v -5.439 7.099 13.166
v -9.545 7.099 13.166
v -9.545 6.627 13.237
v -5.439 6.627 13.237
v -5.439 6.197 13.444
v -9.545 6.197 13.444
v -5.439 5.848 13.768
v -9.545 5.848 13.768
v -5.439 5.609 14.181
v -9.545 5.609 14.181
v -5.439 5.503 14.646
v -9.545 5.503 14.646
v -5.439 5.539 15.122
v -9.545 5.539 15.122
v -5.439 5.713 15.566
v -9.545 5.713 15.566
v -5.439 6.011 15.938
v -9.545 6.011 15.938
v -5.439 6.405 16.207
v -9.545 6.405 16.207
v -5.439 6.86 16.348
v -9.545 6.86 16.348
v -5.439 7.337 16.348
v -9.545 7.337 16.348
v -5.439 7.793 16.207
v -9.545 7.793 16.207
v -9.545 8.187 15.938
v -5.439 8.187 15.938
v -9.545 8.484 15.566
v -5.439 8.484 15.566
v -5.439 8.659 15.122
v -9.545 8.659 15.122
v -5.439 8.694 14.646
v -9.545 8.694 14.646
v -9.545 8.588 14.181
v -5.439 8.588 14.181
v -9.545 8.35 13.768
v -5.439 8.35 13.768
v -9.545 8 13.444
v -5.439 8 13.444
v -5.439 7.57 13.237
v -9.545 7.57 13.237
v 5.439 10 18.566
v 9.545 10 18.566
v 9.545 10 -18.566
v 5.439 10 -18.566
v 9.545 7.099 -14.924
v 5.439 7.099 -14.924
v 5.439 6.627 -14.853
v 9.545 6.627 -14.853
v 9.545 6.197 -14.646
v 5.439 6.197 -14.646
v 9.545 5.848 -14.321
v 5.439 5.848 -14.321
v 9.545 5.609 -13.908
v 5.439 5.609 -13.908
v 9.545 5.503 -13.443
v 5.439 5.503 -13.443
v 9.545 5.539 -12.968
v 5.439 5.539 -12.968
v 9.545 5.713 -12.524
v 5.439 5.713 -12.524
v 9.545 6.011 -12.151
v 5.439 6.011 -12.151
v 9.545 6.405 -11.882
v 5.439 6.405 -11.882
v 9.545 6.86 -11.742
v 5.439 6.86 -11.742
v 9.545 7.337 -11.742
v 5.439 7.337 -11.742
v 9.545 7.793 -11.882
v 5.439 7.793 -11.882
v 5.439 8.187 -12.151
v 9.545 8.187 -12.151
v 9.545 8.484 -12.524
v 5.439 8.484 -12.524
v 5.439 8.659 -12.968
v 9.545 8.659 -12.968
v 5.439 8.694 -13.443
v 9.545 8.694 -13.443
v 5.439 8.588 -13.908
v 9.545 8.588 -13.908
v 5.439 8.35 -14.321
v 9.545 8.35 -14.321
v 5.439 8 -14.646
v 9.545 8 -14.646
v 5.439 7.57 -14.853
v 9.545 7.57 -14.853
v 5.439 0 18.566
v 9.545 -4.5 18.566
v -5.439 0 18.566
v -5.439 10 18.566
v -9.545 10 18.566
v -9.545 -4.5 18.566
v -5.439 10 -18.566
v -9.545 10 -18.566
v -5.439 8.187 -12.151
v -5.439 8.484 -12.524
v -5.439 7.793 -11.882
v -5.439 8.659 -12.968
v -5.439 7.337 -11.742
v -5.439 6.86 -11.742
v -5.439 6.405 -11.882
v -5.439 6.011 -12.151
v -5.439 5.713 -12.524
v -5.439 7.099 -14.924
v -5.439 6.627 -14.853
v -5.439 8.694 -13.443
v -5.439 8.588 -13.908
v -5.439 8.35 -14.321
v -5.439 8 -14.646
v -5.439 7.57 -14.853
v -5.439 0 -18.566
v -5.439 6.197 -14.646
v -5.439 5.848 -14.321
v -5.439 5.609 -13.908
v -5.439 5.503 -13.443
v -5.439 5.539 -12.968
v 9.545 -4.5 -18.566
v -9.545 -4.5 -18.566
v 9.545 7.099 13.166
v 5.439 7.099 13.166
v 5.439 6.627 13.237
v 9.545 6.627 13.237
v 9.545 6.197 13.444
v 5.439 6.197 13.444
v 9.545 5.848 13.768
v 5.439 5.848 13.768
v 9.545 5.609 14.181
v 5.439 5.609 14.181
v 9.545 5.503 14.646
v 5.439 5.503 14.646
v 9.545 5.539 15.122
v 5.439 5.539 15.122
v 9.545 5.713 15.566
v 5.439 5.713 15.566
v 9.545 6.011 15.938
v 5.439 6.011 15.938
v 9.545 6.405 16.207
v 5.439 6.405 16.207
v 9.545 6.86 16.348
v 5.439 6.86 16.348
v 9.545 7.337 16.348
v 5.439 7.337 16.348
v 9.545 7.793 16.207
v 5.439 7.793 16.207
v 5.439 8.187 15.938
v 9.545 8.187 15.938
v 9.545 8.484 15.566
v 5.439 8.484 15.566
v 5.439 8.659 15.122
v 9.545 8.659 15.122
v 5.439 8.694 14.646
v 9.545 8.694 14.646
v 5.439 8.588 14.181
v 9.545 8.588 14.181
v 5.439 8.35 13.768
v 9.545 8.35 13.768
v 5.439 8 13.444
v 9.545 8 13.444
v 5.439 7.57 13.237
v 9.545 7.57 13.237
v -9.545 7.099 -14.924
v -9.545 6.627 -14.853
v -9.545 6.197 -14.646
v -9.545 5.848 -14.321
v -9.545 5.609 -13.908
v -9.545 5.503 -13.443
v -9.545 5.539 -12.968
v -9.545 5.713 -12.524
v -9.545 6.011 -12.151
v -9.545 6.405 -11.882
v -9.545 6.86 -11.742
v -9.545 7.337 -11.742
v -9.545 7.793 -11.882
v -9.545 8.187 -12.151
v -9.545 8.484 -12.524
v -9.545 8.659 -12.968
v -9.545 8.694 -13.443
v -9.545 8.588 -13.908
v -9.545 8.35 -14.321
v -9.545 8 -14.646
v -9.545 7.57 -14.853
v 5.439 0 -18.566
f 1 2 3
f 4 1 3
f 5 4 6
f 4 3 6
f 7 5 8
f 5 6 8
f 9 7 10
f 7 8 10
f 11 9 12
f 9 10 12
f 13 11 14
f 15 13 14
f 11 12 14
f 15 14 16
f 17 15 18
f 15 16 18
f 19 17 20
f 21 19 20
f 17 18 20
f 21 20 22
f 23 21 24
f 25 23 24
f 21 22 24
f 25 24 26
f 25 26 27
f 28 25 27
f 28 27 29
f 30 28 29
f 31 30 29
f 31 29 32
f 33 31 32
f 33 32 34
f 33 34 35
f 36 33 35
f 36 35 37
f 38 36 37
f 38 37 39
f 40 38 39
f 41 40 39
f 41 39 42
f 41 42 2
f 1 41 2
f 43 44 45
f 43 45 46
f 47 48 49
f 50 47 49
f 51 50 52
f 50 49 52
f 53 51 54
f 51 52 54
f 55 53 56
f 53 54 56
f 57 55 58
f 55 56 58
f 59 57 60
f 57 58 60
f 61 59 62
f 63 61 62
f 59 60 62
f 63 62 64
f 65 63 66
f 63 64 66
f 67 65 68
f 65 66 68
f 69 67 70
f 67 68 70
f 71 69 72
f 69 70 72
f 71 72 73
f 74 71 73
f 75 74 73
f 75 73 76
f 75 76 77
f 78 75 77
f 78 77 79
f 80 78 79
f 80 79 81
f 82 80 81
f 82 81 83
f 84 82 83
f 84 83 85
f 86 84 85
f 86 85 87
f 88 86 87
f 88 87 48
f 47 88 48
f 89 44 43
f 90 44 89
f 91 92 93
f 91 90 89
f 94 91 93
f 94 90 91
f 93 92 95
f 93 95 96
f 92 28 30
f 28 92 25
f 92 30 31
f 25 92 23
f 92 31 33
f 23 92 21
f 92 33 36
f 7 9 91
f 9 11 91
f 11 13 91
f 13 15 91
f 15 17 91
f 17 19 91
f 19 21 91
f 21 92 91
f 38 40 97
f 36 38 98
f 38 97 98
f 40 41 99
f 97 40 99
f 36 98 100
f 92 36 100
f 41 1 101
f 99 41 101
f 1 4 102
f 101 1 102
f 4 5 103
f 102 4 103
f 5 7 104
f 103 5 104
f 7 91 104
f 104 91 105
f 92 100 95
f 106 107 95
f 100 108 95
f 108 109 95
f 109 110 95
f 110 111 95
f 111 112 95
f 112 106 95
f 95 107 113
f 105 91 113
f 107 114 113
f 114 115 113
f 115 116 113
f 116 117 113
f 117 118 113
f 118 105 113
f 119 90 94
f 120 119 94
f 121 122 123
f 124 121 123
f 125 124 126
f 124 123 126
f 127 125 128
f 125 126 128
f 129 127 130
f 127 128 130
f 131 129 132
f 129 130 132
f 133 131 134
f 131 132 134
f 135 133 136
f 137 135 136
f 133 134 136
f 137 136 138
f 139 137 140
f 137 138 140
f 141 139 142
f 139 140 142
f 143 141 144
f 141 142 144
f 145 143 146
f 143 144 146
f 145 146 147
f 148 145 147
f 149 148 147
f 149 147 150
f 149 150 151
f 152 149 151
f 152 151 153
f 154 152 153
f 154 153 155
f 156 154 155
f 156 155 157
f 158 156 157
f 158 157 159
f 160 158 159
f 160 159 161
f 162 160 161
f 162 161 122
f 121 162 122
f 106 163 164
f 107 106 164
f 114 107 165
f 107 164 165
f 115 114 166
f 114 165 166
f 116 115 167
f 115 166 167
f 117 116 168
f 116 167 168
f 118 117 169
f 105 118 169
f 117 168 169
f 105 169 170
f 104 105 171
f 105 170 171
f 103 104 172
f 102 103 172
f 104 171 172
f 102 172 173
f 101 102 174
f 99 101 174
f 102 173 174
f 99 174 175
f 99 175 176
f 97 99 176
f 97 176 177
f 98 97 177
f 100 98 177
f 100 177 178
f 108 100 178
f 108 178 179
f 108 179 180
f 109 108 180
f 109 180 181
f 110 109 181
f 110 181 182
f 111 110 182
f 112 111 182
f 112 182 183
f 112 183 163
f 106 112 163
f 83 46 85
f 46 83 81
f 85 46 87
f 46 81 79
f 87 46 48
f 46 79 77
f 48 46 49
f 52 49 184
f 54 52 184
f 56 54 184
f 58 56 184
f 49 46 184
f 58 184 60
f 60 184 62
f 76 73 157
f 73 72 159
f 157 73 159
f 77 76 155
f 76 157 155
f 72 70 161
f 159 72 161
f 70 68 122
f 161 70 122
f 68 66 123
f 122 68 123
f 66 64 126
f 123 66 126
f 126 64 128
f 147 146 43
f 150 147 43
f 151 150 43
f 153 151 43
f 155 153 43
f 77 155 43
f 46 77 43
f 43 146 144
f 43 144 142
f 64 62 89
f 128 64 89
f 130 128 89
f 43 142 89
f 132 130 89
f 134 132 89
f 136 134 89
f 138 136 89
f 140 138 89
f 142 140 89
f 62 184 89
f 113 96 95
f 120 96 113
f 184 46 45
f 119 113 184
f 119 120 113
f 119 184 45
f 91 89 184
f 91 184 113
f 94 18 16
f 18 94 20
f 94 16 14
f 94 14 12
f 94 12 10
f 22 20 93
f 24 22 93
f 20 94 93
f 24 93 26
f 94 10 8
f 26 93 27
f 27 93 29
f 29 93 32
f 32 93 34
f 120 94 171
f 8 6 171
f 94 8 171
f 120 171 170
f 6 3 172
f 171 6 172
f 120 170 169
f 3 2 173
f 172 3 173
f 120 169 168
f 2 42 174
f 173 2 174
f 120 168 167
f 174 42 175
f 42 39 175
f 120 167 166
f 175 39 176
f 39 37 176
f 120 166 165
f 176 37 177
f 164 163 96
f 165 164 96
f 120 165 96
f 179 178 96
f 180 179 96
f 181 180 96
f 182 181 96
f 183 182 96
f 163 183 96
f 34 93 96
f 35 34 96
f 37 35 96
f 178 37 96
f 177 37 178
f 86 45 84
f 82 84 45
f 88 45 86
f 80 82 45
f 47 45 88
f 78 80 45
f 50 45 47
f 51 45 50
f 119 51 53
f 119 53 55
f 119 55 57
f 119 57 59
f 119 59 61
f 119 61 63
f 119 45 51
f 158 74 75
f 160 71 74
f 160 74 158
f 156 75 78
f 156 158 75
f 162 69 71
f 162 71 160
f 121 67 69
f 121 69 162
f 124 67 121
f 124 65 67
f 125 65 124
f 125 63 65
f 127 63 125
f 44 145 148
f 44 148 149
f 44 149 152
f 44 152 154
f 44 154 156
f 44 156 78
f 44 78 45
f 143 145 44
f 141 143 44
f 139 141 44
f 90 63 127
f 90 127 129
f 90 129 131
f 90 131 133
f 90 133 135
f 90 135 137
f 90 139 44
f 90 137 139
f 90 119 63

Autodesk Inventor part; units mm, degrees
ref_plane "YZ Plane" through (0, 0, 0) normal (1, 0, 0) x (0, 1, 0)
ref_plane "XZ Plane" through (0, 0, 0) normal (0, 1, 0) x (-1, 0, 0)
ref_plane "XY Plane" through (0, 0, 0) normal (0, 0, 1) x (1, 0, 0)
sketch "Sketch1" plane through (0, 0, 0) normal (0, 1, 0) x (-1, 0, 0)
  line L0 (-9.5451, 18.566) -> (9.5451, 18.566)
  line L1 (9.5451, 18.566) -> (9.5451, -18.566)
  line L2 (9.5451, -18.566) -> (-9.5451, -18.566)
  line L3 (-9.5451, -18.566) -> (-9.5451, 18.566)
  line L4 (-9.5451, 18.566) -> (9.5451, -18.566) construction
  line L5 (9.5451, 18.566) -> (-9.5451, -18.566) construction
  line L6 (-5.4388, 18.566) -> (5.4388, 18.566)
  line L7 (5.4388, 18.566) -> (5.4388, -18.566)
  line L8 (5.4388, -18.566) -> (-5.4388, -18.566)
  line L9 (-5.4388, -18.566) -> (-5.4388, 18.566)
  line L10 (-5.4388, 18.566) -> (5.4388, -18.566) construction
  line L11 (5.4388, 18.566) -> (-5.4388, -18.566) construction
  point P0 (0, 0)
extrude "Extrusion1" add sketch "Sketch1" along normal blind 10 contours L0 L9 L2 L3 | L0 L1 L2 L7
extrude "Extrusion2" add sketch "Sketch1" against normal blind 4.5
sketch "Sketch2" plane through (9.5451, 10, 18.566) normal (1, 0, 0) x (0, 0, -1)
  line L0 (3.8006, -2.9012) -> (31.8899, -2.9012)
  point P0 (18.566, -10)
hole "Hole1" at (9.5451, 7.0988, 14.7655) at (9.5451, 7.0988, -13.3239) direction (-1, 0, 0) diameter 3.2 end through all
